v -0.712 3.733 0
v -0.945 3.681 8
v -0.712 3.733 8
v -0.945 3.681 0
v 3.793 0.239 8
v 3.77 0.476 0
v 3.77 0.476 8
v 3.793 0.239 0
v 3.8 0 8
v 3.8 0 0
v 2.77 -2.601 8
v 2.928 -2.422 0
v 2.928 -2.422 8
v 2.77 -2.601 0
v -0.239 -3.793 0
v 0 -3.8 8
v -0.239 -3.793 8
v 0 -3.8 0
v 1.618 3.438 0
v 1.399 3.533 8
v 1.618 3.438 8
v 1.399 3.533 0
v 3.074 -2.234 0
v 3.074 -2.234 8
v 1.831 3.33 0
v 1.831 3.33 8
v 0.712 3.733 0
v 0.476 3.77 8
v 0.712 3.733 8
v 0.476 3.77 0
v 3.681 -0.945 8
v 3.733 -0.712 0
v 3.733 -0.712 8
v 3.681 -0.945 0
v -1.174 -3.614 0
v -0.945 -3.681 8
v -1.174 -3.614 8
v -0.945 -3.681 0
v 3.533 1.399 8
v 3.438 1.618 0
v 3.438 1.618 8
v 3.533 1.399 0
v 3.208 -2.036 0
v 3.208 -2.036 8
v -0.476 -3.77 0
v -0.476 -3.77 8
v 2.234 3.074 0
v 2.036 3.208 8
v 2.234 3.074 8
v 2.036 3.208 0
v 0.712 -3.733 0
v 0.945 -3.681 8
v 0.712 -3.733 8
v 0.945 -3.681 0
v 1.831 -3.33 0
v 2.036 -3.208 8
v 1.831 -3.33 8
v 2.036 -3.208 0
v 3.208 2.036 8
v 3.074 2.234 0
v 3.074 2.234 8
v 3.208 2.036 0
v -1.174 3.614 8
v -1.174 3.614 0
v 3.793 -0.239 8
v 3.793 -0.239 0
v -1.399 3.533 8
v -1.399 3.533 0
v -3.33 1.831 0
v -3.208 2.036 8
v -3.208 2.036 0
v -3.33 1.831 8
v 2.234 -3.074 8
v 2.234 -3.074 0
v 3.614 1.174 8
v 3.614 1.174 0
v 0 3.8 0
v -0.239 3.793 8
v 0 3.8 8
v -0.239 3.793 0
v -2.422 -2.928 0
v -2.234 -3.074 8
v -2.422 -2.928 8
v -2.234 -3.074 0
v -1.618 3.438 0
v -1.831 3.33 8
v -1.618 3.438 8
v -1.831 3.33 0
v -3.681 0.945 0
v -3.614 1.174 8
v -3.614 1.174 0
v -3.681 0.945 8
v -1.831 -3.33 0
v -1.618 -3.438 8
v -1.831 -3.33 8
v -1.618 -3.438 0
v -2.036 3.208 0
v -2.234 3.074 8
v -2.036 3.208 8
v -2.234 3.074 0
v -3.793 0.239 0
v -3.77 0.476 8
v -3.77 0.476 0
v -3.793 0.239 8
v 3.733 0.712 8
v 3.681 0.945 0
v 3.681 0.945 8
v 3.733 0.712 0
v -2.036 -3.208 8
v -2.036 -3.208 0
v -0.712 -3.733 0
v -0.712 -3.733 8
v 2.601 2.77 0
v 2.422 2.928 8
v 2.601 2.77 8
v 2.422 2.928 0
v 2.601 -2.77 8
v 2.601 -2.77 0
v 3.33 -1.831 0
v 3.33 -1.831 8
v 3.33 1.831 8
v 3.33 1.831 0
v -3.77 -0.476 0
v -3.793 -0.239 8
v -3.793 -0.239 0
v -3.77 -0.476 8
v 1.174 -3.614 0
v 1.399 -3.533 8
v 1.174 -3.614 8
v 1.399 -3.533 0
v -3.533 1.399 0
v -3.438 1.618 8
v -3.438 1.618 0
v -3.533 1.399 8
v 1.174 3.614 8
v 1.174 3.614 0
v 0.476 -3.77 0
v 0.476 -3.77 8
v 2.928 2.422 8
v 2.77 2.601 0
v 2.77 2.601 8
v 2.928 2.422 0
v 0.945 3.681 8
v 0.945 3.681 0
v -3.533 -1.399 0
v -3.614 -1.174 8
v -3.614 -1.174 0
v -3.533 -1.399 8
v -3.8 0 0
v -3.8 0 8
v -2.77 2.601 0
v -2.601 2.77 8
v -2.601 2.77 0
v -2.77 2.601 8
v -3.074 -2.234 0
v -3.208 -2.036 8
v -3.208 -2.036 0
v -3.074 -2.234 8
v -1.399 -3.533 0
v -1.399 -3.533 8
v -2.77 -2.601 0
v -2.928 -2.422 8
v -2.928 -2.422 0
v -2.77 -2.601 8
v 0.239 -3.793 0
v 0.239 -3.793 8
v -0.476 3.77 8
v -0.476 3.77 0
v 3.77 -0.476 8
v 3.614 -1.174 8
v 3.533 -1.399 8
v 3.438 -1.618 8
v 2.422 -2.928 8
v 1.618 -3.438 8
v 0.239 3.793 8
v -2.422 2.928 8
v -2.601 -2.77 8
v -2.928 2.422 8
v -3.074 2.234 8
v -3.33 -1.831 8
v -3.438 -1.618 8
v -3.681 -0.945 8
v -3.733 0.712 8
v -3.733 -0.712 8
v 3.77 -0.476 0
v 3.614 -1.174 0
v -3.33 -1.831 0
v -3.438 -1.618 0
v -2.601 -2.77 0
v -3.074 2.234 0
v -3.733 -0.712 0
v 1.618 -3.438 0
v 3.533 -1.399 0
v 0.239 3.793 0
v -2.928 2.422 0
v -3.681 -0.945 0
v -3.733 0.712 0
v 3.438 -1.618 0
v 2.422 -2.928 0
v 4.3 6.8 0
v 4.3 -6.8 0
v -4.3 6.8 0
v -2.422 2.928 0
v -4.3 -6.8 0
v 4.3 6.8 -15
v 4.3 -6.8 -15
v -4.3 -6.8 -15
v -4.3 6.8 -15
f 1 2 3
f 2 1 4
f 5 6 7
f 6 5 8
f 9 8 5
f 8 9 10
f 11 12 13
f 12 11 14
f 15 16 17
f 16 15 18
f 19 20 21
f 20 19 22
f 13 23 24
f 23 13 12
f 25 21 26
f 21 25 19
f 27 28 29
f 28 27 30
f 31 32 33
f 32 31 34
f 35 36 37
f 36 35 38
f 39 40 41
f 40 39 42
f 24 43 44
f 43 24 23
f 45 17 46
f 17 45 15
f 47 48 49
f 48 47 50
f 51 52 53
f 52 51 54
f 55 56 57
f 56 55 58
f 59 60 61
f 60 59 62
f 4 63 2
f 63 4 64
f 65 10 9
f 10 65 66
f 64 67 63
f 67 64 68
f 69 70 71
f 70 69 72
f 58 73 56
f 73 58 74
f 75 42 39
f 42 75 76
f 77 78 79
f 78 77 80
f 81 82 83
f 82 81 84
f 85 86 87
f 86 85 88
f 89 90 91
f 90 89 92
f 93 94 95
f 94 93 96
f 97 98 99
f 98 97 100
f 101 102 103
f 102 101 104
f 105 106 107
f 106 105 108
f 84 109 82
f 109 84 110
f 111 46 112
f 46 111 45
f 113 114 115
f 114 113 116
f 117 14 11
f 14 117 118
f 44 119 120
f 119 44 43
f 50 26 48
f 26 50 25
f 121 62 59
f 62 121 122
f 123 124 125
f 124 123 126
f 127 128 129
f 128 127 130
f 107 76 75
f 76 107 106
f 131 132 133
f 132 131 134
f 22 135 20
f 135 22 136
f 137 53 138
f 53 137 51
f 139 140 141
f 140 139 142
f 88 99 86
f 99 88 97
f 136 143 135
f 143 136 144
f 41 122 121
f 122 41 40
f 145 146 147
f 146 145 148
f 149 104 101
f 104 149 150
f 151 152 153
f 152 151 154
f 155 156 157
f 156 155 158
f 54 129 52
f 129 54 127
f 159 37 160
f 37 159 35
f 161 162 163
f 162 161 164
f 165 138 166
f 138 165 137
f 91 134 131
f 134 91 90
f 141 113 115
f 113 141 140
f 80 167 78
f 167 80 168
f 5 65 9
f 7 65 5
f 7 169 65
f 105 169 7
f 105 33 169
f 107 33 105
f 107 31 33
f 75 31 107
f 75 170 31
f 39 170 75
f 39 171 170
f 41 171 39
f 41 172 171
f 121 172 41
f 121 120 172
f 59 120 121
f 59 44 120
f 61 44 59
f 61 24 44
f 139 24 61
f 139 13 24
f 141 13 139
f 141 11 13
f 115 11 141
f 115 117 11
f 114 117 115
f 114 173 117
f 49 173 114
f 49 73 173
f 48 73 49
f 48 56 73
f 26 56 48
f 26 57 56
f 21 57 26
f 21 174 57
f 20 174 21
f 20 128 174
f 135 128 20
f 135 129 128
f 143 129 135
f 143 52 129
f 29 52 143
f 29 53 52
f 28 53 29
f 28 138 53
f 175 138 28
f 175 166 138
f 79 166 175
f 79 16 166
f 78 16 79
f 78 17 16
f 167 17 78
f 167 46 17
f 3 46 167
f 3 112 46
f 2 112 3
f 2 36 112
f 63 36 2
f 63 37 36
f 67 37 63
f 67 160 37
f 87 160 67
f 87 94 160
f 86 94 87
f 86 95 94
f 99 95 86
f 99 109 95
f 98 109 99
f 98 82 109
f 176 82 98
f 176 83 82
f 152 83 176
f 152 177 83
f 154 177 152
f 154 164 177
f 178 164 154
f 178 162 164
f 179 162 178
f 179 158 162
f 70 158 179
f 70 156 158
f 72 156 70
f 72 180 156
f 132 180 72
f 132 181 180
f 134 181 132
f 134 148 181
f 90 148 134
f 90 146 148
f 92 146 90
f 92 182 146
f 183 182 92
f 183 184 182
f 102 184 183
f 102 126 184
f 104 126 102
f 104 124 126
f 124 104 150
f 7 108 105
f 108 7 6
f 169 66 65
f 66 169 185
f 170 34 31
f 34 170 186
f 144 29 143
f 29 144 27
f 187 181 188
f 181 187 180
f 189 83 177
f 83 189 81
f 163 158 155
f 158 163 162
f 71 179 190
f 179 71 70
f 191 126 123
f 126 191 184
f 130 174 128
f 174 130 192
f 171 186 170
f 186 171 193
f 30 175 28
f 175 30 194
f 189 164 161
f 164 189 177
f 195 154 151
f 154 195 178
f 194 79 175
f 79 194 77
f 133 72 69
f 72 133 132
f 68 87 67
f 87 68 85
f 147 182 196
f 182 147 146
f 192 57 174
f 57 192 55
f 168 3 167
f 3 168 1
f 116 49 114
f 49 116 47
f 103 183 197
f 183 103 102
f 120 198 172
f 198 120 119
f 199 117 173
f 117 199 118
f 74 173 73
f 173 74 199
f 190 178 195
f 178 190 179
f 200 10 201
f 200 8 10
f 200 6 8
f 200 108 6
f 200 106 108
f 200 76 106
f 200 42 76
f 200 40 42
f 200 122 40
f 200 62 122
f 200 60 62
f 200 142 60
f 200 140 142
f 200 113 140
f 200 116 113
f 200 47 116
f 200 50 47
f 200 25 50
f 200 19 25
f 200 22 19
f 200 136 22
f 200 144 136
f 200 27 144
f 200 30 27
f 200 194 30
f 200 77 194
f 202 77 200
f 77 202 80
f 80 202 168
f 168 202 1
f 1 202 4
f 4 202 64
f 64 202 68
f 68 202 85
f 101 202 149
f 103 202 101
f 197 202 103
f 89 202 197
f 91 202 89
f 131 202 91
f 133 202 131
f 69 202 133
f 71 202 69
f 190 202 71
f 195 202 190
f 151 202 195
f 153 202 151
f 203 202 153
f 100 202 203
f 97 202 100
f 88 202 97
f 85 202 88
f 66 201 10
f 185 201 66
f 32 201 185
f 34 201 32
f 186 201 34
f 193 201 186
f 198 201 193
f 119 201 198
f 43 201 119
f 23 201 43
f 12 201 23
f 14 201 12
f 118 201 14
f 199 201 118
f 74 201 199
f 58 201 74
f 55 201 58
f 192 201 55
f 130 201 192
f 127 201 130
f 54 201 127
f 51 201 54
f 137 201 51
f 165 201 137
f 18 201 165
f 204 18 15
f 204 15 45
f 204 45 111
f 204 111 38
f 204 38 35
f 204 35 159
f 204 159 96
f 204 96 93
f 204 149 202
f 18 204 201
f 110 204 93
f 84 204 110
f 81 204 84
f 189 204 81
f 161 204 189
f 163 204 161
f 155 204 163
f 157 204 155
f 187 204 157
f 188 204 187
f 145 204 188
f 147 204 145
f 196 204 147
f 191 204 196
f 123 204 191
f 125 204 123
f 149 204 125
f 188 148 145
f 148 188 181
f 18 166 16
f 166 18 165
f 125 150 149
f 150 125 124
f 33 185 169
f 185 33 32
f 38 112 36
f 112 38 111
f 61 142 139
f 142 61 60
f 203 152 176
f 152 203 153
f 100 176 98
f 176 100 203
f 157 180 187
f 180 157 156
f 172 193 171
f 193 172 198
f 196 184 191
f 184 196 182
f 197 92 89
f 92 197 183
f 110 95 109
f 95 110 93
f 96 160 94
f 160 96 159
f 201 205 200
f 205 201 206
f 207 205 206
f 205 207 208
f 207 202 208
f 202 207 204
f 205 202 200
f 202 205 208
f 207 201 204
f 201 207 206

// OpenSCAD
tolerance = 0.3;
$fn = $preview ? 20 : 100;

module switch(width=undef, diameter=undef){
    width = width ? width : 8;
    r = diameter ? diameter/2 : 3.5;
    cylinder(r = r + tolerance, h = 8);
    
    translate([0, 0, -7.5])
    cube([width + tolerance * 2, 13 + tolerance * 2, 15], center = true);
}

switch();
